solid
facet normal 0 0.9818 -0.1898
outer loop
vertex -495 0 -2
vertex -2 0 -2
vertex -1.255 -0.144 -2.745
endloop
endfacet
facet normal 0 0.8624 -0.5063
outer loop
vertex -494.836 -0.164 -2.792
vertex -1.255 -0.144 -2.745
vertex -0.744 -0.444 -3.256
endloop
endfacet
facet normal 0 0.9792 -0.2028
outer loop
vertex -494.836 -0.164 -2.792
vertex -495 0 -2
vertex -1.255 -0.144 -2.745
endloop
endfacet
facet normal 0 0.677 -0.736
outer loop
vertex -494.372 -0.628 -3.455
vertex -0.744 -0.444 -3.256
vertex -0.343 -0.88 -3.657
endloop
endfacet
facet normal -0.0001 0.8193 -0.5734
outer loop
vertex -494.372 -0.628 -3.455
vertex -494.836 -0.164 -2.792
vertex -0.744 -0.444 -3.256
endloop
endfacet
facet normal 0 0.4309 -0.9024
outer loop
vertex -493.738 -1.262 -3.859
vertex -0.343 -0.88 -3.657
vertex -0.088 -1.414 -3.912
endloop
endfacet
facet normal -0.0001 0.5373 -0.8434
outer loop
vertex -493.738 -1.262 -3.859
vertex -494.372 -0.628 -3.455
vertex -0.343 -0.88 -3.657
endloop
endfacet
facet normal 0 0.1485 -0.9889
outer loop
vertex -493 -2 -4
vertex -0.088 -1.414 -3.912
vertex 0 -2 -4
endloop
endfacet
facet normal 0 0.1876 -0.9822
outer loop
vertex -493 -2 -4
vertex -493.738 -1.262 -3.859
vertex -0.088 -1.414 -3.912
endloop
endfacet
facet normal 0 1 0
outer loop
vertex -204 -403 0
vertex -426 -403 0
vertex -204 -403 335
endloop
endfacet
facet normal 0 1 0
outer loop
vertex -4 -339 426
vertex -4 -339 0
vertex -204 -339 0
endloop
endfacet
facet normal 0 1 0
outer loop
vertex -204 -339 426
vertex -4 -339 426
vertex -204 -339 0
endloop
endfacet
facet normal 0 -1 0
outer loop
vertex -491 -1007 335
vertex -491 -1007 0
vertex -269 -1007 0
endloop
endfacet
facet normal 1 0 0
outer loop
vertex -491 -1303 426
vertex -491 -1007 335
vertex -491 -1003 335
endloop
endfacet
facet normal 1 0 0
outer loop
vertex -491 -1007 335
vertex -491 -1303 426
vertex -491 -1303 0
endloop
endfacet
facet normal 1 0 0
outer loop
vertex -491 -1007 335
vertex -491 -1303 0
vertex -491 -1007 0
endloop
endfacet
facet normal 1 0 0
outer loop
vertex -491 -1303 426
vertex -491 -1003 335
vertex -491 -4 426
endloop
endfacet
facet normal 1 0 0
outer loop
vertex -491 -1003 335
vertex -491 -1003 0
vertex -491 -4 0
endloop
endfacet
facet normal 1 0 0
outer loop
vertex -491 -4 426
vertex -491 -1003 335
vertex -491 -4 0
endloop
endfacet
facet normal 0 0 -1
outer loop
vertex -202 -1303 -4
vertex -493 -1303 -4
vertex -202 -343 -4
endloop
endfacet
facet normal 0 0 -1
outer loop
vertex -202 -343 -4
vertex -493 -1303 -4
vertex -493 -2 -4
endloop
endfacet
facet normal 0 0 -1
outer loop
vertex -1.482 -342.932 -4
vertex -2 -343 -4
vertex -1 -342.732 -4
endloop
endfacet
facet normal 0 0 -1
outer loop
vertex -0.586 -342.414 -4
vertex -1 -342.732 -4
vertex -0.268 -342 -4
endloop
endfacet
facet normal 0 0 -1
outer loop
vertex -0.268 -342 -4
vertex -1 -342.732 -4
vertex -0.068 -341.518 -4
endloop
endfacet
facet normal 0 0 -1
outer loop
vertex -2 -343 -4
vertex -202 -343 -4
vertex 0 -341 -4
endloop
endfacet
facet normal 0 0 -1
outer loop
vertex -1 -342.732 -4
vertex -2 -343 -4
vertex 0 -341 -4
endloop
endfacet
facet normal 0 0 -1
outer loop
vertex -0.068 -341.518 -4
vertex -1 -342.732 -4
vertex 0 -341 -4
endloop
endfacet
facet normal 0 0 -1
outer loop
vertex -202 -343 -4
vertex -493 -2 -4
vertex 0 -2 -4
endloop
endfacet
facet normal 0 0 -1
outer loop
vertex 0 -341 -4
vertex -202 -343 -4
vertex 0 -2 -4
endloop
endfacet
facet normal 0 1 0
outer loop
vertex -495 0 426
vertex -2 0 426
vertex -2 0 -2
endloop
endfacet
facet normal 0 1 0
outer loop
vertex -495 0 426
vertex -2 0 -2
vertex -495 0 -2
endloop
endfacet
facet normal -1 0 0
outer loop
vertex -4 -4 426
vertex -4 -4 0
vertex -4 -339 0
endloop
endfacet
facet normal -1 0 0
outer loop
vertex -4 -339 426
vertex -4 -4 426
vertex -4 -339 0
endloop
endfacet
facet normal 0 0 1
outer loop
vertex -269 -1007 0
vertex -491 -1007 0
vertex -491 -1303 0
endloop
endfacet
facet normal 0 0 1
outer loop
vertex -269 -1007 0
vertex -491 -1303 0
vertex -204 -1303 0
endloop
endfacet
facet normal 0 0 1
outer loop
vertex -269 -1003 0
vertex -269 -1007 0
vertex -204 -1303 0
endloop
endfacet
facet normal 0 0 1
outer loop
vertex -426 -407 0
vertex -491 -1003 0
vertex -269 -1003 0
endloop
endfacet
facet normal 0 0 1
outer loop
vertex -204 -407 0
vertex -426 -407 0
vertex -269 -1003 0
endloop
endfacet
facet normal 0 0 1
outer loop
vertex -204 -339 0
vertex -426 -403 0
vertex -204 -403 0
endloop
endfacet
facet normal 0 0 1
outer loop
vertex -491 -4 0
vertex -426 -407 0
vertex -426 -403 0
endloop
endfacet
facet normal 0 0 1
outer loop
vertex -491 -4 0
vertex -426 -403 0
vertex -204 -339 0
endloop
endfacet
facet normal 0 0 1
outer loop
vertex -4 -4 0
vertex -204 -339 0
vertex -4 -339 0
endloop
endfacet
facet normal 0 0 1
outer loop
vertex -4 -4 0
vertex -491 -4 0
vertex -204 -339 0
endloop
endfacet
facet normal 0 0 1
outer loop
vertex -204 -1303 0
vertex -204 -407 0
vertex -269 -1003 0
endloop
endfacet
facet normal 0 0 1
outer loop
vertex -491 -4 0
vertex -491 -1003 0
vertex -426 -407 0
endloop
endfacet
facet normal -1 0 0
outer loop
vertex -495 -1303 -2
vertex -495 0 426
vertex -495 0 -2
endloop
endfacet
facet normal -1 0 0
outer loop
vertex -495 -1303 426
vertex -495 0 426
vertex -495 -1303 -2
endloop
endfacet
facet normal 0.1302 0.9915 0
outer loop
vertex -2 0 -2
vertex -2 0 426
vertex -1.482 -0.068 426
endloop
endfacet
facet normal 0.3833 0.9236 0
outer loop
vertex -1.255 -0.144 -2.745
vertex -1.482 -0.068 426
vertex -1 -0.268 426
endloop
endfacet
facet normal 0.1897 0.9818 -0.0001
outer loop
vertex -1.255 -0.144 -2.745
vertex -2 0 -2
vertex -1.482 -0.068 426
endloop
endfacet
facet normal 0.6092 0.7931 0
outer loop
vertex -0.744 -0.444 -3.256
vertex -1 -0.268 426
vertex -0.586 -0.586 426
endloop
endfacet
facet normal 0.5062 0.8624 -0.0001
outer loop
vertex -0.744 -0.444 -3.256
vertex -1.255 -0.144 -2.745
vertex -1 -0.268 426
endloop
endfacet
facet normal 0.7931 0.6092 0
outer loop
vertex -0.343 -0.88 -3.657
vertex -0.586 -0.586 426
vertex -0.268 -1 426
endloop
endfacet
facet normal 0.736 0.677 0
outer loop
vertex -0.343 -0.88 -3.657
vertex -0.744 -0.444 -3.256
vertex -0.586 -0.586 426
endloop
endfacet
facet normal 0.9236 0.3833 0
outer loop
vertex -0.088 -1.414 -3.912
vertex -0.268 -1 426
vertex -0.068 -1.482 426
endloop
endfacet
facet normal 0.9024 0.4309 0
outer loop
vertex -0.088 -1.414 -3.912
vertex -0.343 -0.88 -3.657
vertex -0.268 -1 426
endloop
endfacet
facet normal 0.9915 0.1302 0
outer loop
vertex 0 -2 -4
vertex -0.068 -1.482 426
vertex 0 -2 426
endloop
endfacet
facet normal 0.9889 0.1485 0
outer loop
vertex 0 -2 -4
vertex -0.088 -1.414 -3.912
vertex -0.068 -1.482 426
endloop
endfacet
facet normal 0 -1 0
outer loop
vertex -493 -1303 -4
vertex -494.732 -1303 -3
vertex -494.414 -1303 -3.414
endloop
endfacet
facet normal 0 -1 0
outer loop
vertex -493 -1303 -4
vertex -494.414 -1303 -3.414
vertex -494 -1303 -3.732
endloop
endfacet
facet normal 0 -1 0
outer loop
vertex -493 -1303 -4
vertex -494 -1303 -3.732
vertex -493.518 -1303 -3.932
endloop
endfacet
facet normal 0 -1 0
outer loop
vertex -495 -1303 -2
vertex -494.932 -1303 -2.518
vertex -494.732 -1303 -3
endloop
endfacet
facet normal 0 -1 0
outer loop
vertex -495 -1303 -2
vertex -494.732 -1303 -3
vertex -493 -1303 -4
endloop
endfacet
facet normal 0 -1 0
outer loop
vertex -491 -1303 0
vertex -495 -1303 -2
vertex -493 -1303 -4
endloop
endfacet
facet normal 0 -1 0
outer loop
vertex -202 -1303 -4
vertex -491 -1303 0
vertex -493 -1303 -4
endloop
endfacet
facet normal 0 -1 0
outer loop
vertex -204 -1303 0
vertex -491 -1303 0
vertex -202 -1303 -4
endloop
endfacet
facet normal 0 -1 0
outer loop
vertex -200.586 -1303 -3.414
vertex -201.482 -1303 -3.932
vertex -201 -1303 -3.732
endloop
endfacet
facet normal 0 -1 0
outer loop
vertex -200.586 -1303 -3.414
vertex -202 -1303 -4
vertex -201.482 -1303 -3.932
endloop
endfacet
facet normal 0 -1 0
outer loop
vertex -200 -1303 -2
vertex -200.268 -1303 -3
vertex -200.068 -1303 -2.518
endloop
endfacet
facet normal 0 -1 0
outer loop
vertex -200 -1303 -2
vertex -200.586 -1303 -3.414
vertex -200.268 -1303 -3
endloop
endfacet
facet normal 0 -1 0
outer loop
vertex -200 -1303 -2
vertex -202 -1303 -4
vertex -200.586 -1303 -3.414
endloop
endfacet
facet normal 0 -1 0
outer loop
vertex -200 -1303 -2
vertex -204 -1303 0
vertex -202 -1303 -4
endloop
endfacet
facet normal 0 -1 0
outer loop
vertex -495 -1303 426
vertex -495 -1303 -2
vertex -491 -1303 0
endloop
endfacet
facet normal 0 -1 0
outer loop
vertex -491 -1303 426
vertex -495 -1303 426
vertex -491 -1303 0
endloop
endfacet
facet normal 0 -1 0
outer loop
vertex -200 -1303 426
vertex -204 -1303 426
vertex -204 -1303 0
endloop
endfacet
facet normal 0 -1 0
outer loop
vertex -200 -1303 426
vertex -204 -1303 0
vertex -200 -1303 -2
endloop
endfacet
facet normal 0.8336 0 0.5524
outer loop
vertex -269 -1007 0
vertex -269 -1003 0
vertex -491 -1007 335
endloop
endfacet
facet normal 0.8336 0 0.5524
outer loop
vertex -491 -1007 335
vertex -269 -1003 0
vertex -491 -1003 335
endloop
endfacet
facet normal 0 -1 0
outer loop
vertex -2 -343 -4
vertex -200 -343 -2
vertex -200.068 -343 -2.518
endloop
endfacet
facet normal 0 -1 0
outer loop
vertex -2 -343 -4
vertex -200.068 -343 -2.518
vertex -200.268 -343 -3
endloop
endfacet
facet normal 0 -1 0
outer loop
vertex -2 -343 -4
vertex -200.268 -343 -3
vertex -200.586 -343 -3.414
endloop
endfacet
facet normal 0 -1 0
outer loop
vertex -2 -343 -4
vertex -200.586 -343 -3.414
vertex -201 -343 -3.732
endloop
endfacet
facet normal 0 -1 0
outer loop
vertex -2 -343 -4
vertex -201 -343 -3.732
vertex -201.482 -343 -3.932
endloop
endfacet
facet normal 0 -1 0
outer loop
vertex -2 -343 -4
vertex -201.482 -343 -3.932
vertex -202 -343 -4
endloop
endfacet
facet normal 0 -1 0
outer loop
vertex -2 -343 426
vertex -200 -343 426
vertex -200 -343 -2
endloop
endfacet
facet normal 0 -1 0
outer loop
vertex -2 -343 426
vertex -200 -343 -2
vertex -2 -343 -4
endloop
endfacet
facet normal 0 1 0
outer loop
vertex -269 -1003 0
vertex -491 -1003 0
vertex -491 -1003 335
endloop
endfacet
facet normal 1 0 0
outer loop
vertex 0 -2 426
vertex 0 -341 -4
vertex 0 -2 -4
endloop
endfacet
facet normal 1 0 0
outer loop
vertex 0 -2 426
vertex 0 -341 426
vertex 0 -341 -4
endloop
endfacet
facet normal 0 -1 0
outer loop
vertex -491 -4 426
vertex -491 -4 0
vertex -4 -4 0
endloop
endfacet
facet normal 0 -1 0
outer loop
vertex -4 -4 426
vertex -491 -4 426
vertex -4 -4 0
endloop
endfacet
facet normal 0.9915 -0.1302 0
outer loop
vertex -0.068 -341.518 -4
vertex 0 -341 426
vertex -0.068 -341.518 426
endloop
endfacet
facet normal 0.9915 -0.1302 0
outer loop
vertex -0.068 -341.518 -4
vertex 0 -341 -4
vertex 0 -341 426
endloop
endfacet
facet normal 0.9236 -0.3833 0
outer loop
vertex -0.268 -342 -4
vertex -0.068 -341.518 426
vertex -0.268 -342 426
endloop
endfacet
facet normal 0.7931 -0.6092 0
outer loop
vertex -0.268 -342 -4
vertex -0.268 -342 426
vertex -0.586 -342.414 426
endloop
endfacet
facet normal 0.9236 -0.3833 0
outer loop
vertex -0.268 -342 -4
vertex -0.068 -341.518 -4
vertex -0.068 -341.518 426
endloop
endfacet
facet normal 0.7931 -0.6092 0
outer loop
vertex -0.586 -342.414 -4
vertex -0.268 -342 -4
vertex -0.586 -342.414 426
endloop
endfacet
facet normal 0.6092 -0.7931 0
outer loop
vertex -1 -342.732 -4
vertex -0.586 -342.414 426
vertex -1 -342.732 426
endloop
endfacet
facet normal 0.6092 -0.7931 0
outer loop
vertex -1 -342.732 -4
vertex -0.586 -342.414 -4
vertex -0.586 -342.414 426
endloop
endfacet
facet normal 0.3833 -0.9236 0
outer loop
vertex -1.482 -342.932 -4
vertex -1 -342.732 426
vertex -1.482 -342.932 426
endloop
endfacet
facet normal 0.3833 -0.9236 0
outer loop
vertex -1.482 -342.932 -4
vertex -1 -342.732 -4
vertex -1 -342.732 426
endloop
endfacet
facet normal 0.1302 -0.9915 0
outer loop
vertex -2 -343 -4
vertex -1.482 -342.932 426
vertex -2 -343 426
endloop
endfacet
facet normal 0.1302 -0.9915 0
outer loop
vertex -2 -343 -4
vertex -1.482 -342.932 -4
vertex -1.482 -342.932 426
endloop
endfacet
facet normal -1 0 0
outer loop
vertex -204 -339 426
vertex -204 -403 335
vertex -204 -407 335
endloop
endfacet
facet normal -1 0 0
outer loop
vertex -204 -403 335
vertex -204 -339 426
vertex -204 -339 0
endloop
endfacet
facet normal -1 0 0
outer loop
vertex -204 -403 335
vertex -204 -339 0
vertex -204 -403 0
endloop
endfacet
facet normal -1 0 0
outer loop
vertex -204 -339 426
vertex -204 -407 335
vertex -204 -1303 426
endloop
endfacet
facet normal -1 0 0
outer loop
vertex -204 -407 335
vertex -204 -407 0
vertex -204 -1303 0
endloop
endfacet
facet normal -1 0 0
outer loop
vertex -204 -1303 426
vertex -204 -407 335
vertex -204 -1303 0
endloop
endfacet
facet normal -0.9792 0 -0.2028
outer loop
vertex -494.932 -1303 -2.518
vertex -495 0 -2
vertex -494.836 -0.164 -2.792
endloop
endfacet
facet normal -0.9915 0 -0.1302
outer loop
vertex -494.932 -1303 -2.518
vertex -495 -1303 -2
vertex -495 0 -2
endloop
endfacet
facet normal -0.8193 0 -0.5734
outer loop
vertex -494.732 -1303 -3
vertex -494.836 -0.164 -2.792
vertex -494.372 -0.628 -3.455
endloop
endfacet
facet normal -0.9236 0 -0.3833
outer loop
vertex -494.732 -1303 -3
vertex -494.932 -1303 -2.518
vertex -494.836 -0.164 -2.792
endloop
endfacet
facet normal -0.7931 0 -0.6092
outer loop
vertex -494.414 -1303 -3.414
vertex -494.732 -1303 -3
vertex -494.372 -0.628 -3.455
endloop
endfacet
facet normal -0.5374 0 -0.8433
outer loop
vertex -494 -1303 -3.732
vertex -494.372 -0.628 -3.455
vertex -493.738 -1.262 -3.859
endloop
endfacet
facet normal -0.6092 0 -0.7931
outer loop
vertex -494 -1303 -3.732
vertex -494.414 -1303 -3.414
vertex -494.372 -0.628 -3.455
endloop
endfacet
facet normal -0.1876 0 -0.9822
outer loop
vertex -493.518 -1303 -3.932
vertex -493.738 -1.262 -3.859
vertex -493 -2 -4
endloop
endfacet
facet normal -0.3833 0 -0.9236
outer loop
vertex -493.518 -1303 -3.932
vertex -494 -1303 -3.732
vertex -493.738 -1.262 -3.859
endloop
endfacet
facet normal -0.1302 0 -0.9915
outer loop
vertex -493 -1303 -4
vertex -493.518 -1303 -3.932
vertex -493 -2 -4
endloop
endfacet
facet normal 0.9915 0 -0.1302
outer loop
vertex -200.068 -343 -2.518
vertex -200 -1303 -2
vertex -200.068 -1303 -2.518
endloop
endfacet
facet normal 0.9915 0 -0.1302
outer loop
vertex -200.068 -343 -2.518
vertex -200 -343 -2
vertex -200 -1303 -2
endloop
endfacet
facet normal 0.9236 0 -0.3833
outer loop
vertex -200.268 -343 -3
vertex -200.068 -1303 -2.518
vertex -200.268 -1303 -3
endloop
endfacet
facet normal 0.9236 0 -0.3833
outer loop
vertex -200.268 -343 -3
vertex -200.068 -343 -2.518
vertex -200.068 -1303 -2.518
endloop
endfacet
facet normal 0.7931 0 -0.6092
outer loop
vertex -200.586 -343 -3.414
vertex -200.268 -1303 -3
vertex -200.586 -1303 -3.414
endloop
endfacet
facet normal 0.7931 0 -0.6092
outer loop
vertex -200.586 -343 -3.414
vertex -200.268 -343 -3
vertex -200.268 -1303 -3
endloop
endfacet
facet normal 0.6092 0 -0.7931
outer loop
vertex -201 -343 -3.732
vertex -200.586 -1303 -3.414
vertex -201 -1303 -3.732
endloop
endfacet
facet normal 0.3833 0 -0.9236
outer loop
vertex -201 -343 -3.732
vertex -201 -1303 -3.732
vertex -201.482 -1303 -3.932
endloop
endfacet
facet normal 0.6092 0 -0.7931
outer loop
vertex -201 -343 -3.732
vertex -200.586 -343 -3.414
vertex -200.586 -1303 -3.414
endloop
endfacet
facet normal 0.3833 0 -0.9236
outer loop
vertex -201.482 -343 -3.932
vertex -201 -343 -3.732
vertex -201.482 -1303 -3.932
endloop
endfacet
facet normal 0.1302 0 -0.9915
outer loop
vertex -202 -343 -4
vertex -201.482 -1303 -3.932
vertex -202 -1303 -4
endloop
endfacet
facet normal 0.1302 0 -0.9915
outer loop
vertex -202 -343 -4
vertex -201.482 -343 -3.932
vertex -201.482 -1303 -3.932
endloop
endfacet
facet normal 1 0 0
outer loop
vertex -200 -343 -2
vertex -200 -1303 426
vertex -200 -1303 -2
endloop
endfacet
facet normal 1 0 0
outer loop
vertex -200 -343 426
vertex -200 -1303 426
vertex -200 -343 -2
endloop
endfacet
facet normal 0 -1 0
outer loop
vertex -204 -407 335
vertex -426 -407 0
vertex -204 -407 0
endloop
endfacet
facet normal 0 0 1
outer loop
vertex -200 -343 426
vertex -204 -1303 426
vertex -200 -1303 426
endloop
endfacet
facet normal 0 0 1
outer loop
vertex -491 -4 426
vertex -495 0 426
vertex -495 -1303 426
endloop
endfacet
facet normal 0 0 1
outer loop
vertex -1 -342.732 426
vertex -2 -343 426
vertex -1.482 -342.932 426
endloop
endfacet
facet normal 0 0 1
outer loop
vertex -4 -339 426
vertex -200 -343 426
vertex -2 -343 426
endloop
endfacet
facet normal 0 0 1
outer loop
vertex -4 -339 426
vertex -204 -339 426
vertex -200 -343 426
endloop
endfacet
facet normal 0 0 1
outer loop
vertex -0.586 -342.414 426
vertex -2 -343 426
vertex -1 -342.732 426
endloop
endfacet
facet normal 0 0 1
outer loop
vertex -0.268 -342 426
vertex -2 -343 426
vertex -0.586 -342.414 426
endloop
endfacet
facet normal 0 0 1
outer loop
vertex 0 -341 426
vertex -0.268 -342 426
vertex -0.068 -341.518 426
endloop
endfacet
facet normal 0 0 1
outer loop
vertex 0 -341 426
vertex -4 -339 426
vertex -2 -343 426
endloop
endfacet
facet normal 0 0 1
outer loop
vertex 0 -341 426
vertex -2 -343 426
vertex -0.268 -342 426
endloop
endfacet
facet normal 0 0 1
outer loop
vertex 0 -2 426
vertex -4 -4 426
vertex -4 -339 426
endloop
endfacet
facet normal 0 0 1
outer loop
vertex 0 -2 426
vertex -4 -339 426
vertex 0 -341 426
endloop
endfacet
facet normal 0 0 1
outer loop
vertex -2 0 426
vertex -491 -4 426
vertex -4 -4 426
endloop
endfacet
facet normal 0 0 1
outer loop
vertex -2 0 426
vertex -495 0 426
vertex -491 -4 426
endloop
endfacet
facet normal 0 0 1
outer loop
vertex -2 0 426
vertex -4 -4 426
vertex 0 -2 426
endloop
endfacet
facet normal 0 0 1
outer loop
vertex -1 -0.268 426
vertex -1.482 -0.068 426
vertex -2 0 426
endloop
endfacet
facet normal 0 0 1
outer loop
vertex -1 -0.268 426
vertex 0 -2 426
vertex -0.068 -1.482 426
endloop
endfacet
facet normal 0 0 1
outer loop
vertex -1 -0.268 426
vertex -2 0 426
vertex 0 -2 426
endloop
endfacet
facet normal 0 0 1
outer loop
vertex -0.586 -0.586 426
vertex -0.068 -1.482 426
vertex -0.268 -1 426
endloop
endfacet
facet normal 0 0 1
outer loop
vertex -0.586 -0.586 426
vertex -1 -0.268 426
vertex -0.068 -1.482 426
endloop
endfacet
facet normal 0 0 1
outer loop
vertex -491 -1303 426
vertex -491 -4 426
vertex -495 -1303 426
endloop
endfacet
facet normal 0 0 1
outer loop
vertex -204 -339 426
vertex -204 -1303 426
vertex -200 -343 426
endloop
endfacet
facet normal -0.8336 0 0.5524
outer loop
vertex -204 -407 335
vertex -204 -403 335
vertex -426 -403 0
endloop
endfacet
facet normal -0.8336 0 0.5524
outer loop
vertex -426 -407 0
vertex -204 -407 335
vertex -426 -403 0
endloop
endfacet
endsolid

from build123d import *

# Parameters (mm, degrees)
F1_DEPTH  = 426
F3_DEPTH  = 4
F4_R      = 2
F7_DEPTH  = 4
F10_DEPTH = 4


# Not quite as in the source:
# - a feature names something its author has since deleted; it is built from what else it names


with BuildPart() as f1:
    # F0 (on Top) → F1 (new body)
    with BuildSketch(Plane.XY):
        Polygon((-200, -343), (0, -343), (0, 0), (-495, 0), (-495, -1303), (-491, -1303), (-491, -4), (-4, -4), (-4, -339), (-204, -339), (-204, -1303), (-200, -1303), align=None)
    extrude(amount=F1_DEPTH)

    # F2 (on Top) → F3 (join)
    with BuildSketch(Plane.XY):
        Polygon((0, 0), (-495, 0), (-495, -1303), (-200, -1303), (-200, -343), (0, -343), align=None)
    extrude(amount=-F3_DEPTH)

    # F4
    f4_edges = [f1.edges().sort_by_distance(p)[0] for p in [
        (-200, -823, -4),
        (-495, -651.5, -4),
        (-247.5, 0, -4),
        (0, -343, 211),
        (0, 0, 211),
    ]]
    fillet(f4_edges, radius=F4_R)

    # F6 (on offset) → F7 (join)
    with BuildSketch(Plane.XZ.offset(1003)):
        Polygon((-491, 0), (-269, 0), (-491, 335), align=None)
    extrude(amount=F7_DEPTH)

    # F9 (on offset) → F10 (join)
    with BuildSketch(Plane.XZ.offset(403)):
        Polygon((-204, 335), (-426, 0), (-204, 0), align=None)
    extrude(amount=F10_DEPTH)


solid = f1.part
